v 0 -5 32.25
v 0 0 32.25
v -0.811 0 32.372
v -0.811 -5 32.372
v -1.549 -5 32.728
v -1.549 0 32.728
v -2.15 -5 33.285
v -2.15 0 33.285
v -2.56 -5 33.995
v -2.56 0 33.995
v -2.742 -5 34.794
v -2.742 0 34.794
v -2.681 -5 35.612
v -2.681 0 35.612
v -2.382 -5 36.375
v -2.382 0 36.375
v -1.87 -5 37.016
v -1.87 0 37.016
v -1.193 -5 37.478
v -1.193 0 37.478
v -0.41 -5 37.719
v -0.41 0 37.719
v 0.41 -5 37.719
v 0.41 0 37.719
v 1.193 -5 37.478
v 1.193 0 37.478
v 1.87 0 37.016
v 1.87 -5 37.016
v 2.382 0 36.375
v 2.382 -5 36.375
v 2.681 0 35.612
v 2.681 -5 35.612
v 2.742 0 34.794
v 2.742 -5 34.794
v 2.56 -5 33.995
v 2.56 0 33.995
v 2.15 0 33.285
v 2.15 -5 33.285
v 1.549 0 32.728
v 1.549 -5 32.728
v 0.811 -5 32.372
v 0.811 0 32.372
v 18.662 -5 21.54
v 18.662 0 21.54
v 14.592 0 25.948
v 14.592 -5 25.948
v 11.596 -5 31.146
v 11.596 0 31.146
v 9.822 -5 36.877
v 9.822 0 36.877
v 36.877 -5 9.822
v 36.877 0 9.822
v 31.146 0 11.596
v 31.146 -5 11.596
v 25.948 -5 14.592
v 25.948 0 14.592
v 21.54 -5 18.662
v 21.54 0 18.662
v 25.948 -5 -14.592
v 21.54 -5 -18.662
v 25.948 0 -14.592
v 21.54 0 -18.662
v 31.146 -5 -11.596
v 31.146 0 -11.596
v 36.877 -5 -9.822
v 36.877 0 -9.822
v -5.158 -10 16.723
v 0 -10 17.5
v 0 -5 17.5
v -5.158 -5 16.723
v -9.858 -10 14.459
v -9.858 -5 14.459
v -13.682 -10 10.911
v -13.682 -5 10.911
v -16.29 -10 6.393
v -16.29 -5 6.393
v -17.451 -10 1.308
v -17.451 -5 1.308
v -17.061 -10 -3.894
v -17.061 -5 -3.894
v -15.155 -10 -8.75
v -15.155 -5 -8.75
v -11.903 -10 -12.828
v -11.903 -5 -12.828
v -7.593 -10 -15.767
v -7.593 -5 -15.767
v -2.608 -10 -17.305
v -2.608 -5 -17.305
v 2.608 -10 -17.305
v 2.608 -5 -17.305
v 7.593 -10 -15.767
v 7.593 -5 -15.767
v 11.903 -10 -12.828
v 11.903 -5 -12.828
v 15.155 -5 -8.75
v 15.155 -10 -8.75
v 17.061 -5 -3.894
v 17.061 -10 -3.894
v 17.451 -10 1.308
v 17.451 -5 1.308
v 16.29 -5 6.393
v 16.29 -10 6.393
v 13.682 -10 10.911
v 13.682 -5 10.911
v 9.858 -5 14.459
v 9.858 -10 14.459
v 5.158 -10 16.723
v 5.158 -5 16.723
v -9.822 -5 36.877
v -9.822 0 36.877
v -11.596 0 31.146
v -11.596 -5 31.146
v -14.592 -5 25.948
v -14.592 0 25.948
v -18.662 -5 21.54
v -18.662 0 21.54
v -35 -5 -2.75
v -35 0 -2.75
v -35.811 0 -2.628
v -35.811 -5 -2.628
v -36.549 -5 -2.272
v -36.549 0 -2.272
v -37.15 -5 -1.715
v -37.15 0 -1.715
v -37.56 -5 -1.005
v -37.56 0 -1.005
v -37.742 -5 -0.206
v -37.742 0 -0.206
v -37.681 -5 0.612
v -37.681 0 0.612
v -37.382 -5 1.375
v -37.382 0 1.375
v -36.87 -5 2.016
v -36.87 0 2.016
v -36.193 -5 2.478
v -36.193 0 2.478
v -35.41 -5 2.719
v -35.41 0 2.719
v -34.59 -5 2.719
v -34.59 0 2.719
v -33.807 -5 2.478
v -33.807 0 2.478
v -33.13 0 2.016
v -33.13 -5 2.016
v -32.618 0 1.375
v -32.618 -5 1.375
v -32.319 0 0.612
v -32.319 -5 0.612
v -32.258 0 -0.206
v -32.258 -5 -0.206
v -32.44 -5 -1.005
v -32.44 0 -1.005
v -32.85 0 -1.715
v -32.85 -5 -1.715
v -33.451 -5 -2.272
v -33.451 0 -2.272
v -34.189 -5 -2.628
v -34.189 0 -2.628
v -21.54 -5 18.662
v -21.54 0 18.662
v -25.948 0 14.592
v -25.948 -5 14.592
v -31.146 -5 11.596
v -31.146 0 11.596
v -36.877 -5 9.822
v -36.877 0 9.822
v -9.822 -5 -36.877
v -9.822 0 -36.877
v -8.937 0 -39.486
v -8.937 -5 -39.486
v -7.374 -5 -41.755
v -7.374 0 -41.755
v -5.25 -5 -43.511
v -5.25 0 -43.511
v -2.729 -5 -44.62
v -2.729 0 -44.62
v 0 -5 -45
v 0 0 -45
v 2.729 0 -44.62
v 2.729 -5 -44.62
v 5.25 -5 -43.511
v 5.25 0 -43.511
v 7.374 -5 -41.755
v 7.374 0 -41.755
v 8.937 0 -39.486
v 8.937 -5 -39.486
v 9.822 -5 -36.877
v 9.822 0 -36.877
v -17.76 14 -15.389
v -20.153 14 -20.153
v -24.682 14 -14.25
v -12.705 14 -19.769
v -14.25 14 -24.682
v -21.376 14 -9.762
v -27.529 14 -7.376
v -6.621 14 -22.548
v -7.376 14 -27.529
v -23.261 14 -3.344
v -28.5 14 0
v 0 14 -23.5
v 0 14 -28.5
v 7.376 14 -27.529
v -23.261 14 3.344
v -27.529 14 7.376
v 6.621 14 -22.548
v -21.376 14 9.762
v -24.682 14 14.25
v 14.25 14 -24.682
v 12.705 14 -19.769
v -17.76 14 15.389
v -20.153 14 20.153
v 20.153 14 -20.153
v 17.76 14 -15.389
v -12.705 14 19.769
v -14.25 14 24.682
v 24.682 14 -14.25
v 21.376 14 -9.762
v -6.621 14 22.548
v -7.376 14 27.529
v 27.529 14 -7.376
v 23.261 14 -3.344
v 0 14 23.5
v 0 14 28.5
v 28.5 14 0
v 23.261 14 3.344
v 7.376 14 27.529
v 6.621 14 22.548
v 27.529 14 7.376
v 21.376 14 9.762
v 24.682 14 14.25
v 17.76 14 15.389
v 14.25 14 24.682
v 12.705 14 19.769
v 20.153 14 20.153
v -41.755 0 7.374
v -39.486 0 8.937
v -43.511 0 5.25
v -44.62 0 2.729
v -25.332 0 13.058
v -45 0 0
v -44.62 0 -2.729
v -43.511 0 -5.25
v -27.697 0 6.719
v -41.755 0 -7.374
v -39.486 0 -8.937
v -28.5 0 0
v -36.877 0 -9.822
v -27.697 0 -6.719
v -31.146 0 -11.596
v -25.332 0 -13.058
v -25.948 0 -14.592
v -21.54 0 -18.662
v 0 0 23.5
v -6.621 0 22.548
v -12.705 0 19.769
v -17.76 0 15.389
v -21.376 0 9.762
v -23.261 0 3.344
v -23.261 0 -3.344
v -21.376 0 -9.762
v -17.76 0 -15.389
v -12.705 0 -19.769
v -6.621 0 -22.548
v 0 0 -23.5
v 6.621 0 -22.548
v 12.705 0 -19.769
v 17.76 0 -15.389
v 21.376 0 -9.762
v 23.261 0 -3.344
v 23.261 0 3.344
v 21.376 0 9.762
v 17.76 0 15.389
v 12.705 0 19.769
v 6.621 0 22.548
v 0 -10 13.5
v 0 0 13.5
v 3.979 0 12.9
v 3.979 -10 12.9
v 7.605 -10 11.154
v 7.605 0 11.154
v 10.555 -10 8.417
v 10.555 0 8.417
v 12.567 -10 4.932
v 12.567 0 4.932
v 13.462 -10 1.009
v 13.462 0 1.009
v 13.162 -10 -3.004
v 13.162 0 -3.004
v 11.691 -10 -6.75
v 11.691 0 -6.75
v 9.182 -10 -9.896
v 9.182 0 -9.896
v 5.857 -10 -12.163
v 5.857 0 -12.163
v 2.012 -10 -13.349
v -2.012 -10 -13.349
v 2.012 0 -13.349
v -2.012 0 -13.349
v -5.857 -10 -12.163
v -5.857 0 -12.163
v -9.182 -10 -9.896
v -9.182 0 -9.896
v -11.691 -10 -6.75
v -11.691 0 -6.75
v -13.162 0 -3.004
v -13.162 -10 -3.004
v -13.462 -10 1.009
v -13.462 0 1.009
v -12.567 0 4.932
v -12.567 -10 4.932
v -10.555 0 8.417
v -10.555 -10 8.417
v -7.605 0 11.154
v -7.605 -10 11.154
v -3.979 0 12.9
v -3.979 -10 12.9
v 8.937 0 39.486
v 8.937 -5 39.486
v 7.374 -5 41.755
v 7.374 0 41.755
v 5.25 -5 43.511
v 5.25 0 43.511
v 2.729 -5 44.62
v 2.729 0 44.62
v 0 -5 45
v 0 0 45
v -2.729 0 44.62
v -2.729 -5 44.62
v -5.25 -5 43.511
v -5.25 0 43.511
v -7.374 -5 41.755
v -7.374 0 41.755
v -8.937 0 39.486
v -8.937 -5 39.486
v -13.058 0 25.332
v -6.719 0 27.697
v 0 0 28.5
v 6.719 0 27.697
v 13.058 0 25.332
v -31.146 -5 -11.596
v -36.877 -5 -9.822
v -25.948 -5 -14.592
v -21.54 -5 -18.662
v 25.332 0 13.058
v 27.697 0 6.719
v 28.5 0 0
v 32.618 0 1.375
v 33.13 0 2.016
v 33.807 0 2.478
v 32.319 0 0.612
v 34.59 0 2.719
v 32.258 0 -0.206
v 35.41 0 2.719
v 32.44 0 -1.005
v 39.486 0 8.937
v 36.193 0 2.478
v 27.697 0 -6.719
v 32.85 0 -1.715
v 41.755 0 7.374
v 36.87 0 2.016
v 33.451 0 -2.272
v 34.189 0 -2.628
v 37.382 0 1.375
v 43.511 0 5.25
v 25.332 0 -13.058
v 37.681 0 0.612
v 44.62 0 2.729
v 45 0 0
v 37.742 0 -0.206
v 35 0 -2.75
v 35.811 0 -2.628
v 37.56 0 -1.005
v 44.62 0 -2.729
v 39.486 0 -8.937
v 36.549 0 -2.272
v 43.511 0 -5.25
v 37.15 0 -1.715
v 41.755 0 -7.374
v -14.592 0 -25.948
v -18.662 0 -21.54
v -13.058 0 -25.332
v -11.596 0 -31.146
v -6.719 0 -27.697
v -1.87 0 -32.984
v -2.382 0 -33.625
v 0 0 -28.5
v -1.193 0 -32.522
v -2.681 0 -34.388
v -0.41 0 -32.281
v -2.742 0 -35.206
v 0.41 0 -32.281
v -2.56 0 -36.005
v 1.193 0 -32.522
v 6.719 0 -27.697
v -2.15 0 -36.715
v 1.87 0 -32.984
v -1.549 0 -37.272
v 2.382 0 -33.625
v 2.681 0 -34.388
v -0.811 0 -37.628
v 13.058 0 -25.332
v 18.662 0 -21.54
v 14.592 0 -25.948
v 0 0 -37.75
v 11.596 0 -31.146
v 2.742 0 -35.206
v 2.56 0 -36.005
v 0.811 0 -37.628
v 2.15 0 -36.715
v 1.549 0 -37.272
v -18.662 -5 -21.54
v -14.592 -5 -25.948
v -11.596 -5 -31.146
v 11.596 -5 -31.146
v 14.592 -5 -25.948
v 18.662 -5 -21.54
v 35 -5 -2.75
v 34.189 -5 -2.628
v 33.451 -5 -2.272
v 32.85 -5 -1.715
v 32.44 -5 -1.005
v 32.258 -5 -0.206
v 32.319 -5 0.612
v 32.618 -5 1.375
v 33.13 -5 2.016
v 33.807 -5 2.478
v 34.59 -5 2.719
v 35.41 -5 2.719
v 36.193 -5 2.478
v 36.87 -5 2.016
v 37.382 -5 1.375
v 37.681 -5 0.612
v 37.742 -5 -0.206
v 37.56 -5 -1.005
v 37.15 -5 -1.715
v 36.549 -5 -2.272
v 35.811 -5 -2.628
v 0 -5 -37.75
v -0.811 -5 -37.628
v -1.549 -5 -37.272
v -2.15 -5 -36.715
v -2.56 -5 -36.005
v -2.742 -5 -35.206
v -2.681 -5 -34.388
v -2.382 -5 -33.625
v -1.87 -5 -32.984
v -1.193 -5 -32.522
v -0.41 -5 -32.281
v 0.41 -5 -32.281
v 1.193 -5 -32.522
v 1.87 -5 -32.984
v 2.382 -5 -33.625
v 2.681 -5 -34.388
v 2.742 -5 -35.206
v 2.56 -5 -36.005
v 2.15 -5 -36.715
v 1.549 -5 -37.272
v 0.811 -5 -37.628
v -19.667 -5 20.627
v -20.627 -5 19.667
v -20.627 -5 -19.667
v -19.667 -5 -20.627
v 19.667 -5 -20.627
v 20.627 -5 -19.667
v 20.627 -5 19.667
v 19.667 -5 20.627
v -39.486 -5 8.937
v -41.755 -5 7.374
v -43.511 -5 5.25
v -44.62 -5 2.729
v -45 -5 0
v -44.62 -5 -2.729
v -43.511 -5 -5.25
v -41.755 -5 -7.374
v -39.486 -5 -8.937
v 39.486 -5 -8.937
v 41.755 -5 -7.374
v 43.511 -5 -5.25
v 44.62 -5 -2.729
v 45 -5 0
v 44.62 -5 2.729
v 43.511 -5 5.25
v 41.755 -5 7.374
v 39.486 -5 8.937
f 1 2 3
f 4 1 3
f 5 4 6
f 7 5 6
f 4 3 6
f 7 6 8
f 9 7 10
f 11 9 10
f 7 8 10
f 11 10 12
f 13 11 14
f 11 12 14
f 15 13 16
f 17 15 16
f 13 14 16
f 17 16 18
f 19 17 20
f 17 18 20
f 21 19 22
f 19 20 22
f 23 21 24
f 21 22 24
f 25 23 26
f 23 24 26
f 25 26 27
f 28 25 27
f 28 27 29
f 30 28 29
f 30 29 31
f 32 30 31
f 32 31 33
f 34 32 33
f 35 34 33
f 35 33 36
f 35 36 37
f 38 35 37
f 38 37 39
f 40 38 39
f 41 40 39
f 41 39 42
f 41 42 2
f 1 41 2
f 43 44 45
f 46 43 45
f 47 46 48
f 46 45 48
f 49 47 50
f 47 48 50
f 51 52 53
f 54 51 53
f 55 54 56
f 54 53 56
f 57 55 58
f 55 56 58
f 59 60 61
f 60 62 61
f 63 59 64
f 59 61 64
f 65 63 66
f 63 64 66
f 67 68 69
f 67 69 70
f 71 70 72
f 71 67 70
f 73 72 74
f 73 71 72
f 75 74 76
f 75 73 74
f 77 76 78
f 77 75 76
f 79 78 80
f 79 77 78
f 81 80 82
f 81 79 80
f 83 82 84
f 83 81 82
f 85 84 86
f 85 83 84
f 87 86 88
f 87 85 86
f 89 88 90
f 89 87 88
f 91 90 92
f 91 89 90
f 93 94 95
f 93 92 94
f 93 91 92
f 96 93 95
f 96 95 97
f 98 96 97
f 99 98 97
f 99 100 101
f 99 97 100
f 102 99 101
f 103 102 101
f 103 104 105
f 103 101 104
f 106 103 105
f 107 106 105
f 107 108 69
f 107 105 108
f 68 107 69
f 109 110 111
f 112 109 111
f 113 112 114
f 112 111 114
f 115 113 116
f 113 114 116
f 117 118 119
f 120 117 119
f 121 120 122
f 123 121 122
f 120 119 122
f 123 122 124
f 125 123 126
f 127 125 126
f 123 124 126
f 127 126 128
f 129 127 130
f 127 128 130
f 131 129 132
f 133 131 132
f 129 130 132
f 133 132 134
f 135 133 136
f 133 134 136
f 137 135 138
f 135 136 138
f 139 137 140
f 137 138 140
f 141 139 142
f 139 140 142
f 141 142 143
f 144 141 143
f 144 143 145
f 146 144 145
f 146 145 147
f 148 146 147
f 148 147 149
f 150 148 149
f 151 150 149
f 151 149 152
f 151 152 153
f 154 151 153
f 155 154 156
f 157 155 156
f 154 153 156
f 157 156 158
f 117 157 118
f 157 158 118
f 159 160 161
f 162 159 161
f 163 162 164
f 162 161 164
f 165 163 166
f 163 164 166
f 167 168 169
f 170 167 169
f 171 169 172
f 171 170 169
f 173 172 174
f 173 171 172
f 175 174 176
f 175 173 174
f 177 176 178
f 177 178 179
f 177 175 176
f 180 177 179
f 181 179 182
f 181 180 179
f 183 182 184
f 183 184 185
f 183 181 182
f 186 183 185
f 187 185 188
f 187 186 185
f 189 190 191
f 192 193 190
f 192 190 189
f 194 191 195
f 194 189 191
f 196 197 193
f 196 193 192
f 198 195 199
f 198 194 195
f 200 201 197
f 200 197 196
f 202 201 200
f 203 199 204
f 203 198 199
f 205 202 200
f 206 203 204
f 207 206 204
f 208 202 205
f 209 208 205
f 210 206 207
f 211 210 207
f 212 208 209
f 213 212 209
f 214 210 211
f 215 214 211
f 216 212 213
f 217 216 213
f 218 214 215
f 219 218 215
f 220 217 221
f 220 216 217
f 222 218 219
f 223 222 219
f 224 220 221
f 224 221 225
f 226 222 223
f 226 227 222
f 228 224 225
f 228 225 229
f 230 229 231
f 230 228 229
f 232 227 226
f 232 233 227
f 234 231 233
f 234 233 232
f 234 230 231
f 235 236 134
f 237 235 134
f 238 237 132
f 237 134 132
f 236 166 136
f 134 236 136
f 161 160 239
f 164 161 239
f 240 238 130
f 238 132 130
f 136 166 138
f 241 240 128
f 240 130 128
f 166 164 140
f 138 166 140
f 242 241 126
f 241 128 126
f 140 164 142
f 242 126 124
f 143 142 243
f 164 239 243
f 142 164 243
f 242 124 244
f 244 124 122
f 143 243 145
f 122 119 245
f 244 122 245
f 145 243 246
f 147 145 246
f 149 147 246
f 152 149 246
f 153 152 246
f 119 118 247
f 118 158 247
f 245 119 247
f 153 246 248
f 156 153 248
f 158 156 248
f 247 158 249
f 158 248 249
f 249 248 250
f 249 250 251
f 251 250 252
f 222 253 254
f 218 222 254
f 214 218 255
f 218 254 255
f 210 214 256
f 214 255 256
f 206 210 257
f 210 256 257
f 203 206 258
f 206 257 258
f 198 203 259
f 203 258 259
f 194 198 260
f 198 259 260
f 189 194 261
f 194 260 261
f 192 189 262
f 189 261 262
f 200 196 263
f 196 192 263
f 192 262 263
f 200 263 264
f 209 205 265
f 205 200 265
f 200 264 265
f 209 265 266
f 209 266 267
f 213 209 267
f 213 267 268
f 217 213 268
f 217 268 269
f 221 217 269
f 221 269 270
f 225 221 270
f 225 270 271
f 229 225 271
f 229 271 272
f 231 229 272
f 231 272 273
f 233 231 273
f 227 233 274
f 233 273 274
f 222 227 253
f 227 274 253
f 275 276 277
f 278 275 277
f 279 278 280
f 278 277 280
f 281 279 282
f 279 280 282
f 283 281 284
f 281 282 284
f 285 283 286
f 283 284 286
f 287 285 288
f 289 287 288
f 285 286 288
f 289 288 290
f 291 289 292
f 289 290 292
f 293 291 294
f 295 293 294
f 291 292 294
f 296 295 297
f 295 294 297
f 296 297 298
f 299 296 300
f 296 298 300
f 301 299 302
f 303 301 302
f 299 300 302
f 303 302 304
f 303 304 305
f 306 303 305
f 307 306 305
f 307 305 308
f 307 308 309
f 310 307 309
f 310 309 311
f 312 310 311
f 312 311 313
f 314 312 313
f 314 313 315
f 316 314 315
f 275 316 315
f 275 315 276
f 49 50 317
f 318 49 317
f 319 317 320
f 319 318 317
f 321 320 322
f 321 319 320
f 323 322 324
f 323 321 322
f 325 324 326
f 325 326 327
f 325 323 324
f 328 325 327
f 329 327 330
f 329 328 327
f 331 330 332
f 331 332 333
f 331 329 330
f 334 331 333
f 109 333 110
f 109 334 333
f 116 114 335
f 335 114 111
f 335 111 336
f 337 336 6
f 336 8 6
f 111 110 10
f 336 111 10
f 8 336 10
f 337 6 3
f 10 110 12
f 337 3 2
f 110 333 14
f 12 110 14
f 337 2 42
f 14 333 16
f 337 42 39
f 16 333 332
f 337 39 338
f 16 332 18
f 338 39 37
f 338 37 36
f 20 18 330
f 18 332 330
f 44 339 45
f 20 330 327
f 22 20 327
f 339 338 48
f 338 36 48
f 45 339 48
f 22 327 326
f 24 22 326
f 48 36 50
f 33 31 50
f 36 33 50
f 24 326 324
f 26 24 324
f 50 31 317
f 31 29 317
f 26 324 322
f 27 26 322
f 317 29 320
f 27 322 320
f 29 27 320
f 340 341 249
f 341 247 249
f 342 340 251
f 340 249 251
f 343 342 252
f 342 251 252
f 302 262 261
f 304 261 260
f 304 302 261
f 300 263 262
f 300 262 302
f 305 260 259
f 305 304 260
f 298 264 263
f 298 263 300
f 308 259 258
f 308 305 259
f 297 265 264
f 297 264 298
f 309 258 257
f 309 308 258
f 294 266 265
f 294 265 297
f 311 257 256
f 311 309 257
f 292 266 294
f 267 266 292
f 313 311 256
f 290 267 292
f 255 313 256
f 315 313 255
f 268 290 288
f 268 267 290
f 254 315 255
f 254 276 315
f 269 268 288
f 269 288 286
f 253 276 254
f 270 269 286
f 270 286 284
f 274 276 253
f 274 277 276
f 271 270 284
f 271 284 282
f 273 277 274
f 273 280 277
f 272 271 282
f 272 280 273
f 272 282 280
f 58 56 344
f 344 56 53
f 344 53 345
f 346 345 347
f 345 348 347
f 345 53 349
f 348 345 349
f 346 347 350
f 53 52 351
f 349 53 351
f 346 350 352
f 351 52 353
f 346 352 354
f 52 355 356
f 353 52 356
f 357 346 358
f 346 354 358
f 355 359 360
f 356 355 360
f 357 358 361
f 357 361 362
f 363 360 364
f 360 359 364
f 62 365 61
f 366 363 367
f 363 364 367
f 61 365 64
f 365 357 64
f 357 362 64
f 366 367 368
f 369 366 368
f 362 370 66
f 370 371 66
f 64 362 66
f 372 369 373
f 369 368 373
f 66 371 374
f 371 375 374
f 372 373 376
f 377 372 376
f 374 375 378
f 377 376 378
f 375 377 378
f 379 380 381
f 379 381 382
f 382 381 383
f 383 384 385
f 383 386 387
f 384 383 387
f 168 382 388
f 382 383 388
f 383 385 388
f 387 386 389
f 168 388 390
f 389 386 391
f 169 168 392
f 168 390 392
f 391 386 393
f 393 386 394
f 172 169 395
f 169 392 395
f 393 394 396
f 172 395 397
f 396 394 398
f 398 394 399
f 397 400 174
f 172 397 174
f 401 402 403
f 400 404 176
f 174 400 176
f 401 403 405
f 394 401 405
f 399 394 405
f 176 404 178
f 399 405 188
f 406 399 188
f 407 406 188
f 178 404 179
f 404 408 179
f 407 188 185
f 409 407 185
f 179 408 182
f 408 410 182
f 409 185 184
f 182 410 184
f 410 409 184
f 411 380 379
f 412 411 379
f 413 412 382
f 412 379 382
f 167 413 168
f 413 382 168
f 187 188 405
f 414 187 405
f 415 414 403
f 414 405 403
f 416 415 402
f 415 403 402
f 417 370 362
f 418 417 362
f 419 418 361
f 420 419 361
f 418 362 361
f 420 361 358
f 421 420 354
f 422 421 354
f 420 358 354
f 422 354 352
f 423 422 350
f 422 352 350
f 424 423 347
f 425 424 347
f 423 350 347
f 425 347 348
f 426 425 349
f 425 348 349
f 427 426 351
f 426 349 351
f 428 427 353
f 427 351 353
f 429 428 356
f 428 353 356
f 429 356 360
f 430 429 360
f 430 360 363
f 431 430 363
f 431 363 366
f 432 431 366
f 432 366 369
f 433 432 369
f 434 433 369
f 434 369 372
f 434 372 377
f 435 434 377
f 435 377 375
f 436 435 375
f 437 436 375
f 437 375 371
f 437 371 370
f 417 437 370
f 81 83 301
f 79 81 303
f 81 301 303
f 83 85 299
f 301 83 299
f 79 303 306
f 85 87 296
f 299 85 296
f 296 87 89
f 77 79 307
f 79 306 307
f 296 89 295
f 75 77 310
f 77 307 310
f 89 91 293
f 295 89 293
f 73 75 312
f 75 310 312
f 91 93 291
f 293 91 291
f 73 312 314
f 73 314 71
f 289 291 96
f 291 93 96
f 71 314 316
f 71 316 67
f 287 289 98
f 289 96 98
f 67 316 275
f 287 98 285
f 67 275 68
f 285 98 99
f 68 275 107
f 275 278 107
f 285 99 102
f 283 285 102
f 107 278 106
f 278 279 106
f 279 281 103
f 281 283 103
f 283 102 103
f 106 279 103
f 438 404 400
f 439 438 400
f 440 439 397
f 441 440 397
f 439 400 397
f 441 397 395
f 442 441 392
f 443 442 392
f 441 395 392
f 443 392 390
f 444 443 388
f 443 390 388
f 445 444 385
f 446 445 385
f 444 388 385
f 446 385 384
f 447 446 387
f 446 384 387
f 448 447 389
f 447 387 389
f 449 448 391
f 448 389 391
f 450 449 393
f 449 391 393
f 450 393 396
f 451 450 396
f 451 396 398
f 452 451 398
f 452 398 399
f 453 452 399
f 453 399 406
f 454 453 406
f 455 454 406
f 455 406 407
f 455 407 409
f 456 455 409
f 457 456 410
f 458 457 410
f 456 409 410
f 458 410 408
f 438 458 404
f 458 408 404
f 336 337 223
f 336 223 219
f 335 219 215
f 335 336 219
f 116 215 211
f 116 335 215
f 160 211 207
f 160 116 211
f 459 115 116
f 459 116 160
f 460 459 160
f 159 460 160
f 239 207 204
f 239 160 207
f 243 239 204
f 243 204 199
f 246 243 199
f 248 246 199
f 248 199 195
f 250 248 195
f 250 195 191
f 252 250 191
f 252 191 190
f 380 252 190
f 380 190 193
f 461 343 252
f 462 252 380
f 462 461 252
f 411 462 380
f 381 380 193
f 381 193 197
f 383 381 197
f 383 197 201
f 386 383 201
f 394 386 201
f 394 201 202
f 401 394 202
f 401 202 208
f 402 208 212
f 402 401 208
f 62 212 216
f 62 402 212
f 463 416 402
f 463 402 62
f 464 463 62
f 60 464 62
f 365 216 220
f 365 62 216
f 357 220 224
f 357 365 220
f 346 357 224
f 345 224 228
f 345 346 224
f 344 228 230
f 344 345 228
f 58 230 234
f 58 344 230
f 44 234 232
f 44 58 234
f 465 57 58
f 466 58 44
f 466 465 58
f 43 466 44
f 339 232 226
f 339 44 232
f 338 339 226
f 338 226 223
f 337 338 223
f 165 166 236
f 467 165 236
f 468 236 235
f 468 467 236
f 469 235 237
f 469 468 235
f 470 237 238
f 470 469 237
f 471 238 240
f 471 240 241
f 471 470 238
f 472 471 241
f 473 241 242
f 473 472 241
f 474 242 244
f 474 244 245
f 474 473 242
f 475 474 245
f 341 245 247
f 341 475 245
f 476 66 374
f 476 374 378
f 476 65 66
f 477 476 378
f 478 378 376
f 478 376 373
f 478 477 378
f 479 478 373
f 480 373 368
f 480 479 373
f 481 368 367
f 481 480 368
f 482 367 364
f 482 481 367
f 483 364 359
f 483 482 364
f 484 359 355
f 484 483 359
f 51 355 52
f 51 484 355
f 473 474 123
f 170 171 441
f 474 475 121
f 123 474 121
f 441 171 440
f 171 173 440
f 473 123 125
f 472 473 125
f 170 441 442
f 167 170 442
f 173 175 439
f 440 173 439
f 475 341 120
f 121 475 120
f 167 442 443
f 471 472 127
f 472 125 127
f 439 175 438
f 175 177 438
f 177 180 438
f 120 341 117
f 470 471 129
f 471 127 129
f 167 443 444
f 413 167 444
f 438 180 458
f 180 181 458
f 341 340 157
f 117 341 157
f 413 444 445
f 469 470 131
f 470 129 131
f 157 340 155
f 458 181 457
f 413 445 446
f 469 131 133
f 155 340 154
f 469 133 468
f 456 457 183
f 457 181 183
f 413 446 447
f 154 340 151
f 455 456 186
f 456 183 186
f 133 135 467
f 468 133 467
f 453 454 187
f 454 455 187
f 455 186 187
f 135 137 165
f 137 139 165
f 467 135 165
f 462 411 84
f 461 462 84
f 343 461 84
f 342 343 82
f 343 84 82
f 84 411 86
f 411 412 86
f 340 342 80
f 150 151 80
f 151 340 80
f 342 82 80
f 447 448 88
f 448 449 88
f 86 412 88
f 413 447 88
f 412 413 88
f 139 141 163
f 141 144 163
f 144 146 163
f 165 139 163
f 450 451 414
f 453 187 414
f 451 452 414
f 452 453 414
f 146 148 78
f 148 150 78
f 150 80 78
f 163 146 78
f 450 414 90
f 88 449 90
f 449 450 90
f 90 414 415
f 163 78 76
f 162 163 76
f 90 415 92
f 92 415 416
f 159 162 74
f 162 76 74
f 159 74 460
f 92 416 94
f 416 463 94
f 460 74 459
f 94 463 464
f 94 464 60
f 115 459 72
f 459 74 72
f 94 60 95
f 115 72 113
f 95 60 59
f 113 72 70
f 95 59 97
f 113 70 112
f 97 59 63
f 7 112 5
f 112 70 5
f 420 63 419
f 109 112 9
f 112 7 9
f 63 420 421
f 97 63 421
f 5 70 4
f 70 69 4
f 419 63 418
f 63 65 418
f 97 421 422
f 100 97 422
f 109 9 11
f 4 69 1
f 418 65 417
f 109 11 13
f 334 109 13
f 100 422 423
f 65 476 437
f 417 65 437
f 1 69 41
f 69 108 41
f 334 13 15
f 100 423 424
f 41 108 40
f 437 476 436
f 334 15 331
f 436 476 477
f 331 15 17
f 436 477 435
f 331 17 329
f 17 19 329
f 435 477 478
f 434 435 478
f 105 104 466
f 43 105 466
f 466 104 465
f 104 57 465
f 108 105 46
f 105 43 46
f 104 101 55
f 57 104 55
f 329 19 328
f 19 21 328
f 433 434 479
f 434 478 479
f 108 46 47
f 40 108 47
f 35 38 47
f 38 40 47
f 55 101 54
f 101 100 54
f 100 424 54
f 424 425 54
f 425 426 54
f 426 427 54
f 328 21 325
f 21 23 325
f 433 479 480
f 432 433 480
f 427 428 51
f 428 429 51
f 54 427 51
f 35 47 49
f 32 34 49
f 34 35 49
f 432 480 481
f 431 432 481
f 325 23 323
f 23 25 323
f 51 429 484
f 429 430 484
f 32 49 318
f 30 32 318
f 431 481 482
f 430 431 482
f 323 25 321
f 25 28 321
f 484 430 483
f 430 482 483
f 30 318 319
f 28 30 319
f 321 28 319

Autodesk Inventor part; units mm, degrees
ref_plane "YZ Plane" through (0, 0, 0) normal (1, 0, 0) x (0, 1, 0)
ref_plane "XZ Plane" through (0, 0, 0) normal (0, 1, 0) x (-1, 0, 0)
ref_plane "XY Plane" through (0, 0, 0) normal (0, 0, 1) x (1, 0, 0)
sketch "Sketch1" plane through (0, 0, 0) normal (1, 0, 0) x (0, 1, 0)
  line L0 (0, 0) -> (0, 23.5) construction
  line L1 (0, 23.5) -> (14, 23.5) construction
  line L2 (14, 23.5) -> (14, 0) construction
  line L3 (14, 23.5) -> (14, 28.5)
  line L4 (14, 28.5) -> (-5, 28.5)
  line L5 (14, 23.5) -> (0, 23.5)
  line L6 (-5, 28.5) -> (-5, 17.5)
  line L7 (-5, 17.5) -> (-10, 17.5)
  line L8 (-14.8, 0) -> (18.8, 0) projected
  line L9 (-10, 0) -> (-10, 13.5) construction
  line L10 (-10, 13.5) -> (0, 13.5)
  line L11 (0, 23.5) -> (0, 13.5)
  line L12 (-10, 17.5) -> (-10, 13.5)
  dimension "d0" = 23.5
  dimension "d1" = 14
  dimension "d2" = 5
  dimension "d3" = 19
  dimension "d8" = 11
  dimension "d9" = 5
  dimension "d11" = 13.5
revolve "Revolution1" add sketch "Sketch1" angle 360 about axis through (0, -10, 0) along (0, 1, 0)
sketch "Sketch2" plane through (0, -5, 0) normal (0, -1, 0) x (1, 0, 0)
  line L0 (-35, 0) -> (35, 0) construction
  arc A0 (-35, 10) -> (-35, -10) centre (-35, 0) ccw
  arc A1 (35, -10) -> (35, 10) centre (35, 0) ccw
  line L1 (0, -35) -> (0, 35) construction
  arc A2 (-10, -35) -> (10, -35) centre (0, -35) ccw
  arc A3 (10, 35) -> (-10, 35) centre (0, 35) ccw
  line L2 (-10, 35) -> (-10, 10)
  line L3 (-10, -10) -> (-10, -35)
  line L4 (35, 10) -> (10, 10)
  line L5 (-10, 10) -> (-35, 10)
  line L6 (10, -35) -> (10, -10)
  line L7 (10, 10) -> (10, 35)
  line L8 (-35, -10) -> (-10, -10)
  line L9 (10, -10) -> (35, -10)
  circle A4 centre (0, 0) radius 13.5
  dimension "d12" = 35
  dimension "d13" = 20
  dimension "d14" = 35
  dimension "d15" = 20
extrude "Extrusion1" add sketch "Sketch2" against normal blind 5
fillet "Fillet1" radius 27 8 edges at (10, -2.5, 26.688) (26.688, -2.5, 10) (-10, -2.5, 26.688) (-26.688, -2.5, 10) (-26.688, -2.5, -10) (-10, -2.5, -26.688) (10, -2.5, -26.688) (26.688, -2.5, -10)
hole "Hole1" at (0, -5, 35) at (35, -5, 0) at (0, -5, -35) at (-35, -5, 0) direction (0, 1, 0) diameter 5.5 end through all clearance for "Hex Head Bolt" size "M5" standard "Ansi Metric M Profile"
properties part number "ThrustBearingMount" material "ABS Plastic"
